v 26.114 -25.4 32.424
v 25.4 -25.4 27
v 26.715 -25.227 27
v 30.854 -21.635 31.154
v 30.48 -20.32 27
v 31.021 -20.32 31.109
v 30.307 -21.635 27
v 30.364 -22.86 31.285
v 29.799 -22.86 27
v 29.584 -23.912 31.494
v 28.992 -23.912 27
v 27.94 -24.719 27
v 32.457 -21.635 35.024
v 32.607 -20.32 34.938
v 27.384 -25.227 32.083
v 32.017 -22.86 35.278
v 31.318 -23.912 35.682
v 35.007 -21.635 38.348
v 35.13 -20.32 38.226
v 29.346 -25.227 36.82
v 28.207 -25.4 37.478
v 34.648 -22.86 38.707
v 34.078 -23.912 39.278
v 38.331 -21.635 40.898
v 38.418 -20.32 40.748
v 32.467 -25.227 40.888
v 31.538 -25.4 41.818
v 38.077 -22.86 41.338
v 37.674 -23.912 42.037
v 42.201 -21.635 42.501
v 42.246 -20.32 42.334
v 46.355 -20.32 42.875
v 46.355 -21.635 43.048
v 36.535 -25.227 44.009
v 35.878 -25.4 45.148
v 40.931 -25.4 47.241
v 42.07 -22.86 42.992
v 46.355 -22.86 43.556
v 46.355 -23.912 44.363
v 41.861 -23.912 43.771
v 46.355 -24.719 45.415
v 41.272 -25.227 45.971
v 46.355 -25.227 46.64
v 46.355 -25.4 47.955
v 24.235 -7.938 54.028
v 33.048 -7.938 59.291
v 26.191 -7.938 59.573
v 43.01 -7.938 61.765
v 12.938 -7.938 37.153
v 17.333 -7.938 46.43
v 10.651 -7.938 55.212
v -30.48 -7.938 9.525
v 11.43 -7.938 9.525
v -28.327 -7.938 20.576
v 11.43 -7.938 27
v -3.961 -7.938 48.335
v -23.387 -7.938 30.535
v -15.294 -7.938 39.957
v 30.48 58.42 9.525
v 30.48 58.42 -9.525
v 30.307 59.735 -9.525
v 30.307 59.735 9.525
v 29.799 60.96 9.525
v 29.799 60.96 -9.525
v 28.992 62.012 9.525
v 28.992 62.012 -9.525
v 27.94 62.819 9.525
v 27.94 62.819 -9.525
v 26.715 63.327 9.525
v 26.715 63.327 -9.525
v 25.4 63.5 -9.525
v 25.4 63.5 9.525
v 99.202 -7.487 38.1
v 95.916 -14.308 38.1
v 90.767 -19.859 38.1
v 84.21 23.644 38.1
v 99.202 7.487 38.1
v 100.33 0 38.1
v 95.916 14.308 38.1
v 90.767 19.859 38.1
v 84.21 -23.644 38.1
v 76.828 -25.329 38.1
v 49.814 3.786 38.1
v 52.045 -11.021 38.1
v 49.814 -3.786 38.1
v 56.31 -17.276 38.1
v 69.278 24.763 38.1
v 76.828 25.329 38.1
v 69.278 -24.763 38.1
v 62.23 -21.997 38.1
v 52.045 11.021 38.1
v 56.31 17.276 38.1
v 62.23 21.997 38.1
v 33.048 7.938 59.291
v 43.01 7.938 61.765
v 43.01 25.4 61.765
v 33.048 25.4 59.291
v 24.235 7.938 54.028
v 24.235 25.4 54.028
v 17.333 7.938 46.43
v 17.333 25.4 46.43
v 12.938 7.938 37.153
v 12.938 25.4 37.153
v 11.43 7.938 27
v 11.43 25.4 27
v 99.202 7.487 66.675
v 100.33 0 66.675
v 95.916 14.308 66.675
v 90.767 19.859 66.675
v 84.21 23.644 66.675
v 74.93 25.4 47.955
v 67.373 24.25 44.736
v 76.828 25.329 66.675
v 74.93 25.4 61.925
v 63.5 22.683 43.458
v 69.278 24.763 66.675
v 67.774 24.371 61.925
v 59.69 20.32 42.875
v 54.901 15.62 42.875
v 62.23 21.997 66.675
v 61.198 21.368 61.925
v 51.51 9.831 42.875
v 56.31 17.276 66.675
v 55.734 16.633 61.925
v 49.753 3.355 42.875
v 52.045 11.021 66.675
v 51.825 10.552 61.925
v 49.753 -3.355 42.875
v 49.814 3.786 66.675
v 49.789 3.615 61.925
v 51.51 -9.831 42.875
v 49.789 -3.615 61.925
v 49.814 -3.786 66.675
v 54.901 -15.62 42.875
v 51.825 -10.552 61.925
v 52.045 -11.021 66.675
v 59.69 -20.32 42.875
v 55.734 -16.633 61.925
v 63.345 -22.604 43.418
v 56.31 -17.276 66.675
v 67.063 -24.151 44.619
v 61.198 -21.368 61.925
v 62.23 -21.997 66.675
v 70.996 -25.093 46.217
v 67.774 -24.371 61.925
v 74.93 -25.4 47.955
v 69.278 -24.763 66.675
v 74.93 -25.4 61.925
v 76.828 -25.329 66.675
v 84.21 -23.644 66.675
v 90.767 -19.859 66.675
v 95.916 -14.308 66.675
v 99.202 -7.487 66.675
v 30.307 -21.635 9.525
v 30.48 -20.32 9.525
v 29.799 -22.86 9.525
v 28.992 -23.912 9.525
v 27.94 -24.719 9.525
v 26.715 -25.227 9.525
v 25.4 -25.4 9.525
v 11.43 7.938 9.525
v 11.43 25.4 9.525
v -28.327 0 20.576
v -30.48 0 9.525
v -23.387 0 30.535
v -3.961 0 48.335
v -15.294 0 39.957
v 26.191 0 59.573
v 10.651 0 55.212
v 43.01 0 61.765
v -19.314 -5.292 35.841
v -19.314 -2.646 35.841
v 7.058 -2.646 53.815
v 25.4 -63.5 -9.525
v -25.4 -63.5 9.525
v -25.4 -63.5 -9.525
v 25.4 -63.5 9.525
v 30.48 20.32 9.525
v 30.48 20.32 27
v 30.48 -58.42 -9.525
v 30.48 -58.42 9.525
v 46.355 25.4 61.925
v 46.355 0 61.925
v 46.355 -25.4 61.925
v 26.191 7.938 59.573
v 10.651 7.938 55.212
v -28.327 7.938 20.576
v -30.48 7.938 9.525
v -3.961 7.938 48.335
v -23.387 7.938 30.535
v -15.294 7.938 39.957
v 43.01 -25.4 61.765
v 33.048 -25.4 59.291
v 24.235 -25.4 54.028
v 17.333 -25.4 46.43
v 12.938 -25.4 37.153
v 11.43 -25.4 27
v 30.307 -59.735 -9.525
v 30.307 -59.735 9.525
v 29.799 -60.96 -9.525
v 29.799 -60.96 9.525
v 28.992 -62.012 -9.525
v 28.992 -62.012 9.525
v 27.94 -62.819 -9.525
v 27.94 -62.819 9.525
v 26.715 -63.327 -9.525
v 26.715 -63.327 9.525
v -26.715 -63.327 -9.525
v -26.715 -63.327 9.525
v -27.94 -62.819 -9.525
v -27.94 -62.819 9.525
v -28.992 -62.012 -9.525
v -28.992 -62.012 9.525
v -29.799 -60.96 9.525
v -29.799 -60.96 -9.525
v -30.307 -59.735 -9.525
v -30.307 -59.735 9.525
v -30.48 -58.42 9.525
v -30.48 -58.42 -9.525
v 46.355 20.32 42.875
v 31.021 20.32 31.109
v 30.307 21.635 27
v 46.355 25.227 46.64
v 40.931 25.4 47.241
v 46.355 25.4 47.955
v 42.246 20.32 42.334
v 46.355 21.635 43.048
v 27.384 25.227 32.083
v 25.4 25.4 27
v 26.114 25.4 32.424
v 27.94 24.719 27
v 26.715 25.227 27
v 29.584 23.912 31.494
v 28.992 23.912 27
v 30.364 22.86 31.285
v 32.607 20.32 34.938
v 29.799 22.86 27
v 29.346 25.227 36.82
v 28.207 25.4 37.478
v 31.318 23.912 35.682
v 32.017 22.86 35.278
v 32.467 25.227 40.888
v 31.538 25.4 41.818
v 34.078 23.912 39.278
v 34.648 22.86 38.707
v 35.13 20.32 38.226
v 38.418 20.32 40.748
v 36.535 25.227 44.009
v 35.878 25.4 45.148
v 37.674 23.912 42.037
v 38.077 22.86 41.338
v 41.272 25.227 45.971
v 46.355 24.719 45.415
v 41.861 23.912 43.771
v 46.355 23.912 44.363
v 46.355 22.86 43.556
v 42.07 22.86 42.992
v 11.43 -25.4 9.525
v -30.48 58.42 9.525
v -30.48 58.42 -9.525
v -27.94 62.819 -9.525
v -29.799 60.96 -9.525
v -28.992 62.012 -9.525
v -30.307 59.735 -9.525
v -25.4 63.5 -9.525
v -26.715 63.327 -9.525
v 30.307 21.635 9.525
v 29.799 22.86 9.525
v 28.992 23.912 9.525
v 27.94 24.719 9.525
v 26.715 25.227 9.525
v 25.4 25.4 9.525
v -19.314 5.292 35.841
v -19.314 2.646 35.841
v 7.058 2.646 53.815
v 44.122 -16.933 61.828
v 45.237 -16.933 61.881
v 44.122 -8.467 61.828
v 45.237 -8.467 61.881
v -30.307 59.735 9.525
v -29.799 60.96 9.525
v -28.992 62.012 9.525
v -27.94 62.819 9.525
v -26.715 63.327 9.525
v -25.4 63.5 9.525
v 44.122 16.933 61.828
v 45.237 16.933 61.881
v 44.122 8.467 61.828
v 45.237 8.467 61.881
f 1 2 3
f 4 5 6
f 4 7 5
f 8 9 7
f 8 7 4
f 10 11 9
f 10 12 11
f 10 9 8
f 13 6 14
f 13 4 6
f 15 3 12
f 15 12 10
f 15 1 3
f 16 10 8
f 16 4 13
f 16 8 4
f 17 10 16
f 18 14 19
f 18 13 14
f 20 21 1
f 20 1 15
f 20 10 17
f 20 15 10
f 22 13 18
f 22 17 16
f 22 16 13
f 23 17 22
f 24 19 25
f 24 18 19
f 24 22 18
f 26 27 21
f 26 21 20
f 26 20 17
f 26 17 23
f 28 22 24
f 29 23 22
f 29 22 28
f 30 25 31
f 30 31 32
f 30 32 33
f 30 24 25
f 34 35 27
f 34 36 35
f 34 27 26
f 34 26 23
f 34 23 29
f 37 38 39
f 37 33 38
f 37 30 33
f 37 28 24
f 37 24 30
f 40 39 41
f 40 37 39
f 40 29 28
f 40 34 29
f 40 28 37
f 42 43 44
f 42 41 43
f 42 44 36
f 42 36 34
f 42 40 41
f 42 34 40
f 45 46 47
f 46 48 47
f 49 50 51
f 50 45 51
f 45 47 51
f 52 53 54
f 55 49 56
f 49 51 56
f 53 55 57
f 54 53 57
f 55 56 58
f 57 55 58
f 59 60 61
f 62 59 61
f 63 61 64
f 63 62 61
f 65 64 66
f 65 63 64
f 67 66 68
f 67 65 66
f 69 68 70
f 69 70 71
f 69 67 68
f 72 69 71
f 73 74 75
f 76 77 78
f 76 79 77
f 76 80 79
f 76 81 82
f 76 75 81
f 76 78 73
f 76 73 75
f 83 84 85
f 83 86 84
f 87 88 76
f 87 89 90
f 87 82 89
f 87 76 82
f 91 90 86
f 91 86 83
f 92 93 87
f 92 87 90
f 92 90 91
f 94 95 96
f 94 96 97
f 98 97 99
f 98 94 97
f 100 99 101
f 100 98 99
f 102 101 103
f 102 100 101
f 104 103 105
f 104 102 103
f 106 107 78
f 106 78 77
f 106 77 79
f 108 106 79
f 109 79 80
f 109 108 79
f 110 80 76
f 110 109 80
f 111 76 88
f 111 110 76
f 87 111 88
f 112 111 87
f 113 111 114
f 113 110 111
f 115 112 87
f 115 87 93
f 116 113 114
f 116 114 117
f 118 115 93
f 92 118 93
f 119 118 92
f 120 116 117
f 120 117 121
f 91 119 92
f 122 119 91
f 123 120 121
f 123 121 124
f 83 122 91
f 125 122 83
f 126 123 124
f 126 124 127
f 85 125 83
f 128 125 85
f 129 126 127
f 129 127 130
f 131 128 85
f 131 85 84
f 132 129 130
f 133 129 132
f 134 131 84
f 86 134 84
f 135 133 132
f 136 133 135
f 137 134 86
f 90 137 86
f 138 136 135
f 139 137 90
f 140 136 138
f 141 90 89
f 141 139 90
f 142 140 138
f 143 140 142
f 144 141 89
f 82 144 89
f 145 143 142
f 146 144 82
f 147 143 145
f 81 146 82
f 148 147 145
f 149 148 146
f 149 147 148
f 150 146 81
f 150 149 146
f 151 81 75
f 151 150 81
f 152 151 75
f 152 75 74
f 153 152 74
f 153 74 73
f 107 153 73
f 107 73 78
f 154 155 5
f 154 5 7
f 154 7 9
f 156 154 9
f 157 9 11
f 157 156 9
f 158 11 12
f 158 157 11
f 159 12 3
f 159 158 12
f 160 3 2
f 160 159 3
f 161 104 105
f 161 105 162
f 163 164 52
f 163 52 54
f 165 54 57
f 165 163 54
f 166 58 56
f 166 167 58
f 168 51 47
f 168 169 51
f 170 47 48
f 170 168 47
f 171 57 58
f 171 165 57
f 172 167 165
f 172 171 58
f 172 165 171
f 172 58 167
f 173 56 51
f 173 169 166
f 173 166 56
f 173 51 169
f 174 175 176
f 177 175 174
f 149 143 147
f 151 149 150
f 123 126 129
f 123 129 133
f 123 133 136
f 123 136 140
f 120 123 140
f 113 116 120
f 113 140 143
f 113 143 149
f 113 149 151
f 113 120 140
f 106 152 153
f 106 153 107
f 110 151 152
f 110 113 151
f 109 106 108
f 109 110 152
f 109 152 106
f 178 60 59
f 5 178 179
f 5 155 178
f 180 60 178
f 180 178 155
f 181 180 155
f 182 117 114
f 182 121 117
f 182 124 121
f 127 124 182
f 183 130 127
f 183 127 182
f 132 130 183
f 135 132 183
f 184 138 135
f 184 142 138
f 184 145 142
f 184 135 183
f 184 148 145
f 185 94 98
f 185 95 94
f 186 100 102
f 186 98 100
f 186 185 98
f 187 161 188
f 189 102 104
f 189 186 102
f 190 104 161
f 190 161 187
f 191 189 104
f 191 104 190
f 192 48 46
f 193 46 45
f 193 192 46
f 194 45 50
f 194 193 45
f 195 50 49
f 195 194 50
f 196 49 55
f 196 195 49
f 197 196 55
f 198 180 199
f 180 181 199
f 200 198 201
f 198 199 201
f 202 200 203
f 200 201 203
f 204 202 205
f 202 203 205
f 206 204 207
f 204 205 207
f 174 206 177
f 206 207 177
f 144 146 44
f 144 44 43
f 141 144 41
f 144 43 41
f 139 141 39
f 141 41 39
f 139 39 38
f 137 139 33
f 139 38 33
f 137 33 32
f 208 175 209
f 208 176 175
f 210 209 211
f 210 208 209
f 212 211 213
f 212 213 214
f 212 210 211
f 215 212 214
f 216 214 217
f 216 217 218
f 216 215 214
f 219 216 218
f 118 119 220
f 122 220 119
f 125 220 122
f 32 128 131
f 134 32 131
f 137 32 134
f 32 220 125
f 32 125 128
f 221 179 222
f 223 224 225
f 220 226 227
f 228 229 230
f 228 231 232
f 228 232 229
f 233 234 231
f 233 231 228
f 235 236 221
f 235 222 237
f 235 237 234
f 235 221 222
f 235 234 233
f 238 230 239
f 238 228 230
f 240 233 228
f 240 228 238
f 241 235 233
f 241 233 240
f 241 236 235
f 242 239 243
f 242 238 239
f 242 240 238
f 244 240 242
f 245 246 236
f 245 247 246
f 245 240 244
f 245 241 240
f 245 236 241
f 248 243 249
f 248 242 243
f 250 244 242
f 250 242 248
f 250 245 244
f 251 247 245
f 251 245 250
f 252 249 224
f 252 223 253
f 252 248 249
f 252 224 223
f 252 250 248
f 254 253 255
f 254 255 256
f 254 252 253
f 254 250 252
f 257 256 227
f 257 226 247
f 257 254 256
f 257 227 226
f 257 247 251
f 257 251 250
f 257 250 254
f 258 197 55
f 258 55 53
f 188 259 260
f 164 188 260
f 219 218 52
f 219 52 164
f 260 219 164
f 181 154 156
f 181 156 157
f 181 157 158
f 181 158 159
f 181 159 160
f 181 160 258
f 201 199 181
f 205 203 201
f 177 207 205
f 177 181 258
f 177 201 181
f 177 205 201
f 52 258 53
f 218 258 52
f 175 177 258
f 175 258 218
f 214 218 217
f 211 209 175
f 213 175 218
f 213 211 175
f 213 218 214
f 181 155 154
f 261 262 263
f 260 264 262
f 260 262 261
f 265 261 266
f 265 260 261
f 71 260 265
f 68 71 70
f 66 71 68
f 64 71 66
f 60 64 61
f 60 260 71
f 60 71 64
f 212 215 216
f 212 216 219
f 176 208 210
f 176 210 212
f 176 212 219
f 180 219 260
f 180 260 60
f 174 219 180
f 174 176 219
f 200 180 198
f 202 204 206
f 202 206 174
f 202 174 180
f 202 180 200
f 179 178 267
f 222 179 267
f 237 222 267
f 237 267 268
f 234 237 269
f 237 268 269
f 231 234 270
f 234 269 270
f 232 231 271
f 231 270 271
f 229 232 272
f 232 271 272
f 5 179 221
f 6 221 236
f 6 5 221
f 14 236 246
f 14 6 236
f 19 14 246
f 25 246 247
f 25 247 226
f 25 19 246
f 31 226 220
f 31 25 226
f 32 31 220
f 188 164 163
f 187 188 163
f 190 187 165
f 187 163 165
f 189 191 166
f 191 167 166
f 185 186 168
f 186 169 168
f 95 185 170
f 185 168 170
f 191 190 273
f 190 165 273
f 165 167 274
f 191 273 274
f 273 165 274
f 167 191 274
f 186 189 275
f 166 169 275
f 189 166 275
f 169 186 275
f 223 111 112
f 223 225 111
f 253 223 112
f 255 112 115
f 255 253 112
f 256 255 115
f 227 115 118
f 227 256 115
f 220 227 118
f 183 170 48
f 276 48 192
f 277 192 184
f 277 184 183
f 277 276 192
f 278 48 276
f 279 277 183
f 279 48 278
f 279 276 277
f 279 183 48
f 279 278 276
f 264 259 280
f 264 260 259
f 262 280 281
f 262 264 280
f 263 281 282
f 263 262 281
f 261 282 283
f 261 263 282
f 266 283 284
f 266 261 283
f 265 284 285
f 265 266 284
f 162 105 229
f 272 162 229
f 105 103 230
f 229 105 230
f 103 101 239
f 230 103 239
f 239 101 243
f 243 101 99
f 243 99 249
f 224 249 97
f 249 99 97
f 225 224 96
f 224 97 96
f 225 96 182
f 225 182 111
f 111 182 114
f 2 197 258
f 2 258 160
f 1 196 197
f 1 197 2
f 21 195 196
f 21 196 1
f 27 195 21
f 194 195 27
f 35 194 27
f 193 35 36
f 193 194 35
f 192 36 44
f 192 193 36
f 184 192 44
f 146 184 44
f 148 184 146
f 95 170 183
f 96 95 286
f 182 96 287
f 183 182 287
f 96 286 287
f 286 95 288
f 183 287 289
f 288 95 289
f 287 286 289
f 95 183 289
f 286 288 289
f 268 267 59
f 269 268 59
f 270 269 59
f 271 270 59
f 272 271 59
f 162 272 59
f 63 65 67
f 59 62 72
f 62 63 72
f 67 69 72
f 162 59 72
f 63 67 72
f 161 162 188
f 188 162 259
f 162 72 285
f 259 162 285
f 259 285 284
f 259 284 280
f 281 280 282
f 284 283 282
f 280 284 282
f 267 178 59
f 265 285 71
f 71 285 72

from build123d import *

# Parameters (mm, degrees)
F1_DEPTH     = 63.5
F0_W         = 25.4
F0_H         = 19.05
F2_DEPTH     = 25.4
F3_DEPTH     = 7.9375
F5_R         = 5.08
F6_T1_DEPTH  = 17.4752
F6_T6_DEPTH  = 50.165
F6_S7_R      = 25.4
F6_T8_DEPTH  = 27
F6_T10_ANGLE = 90
F7_T1_DEPTH  = 17.4752
F7_T6_DEPTH  = 50.165
F7_S7_R      = 25.4
F7_T8_DEPTH  = 27
F7_T10_ANGLE = 90


# Not quite as in the source:
# - a fillet or chamfer that OpenCascade refuses, or shapes differently, is made with other operations: its cross-section is extruded or revolved along the edge and cut away or added


with BuildPart() as f1:
    # F0 (on Front) → F1 (new body, symmetric)
    with BuildSketch(Plane.XZ):
        Polygon((11.43, 9.525), (-30.48, 9.525), (-30.48, -9.525), (30.48, -9.525), (30.48, 9.525), align=None)
    extrude(amount=F1_DEPTH, both=True)

    # F0 (on Front) → F2 (join, symmetric)
    with BuildSketch(Plane.XZ):
        with BuildLine():
            Line((11.43, 27.0002), (11.43, 9.525))
            Line((11.43, 9.525), (30.48, 9.525))
            Line((30.48, 9.525), (30.48, 27.0002))
            ThreePointArc((30.48, 27.0002), (35.1296798487, 38.2255201513), (46.355, 42.8752))
            Line((46.355, 42.8752), (49.53, 42.8752))
            Line((49.53, 42.8752), (49.53, 61.9252))
            Line((49.53, 61.9252), (46.355, 61.9252))
            add(Edge.make_bspline(
                [(43.0102942151, 61.7646727878), (44.1205521815, 61.8325692622), (45.2356507943, 61.8861371605), (46.355, 61.9252)],
                knots=[90.4192998356, 90.4192998356, 90.4192998356, 90.4192998356, 93.0021407551, 93.0021407551, 93.0021407551, 93.0021407551], degree=3))
            ThreePointArc((43.0102942151, 61.7646727878), (20.5037962124, 50.4836172925), (11.43, 27.0002))
        make_face()
        with Locations((62.23, 52.4002)):
            Rectangle(F0_W, F0_H)
    extrude(amount=F2_DEPTH, both=True)

    # F0 (on Front) → F3 (join, symmetric)
    with BuildSketch(Plane.XZ):
        with BuildLine():
            add(Edge.make_bspline(
                [(-30.48, 9.525), (-28.7924455478, 39.4506532923), (4.142725098, 59.3877739136), (43.0102942151, 61.7646727878)],
                knots=[0, 0, 0, 0, 90.4192998356, 90.4192998356, 90.4192998356, 90.4192998356], degree=3))
            Line((-30.48, 9.525), (11.43, 9.525))
            Line((11.43, 9.525), (11.43, 27.0002))
            ThreePointArc((11.43, 27.0002), (20.5037962124, 50.4836172925), (43.0102942151, 61.7646727878))
        make_face()
    extrude(amount=F3_DEPTH, both=True)

    # F0 (on Front) → F4 (revolve)
    with BuildSketch(Plane.XZ):
        Polygon((74.93, 66.675), (74.93, 61.9252), (74.93, 42.8752), (74.93, 38.1), (100.33, 38.1), (100.33, 66.675), align=None)
    revolve(axis=Axis((74.93, 0, 52.3875), (0, 0, 1)))

    # F5
    f5_edges = [f1.edges().sort_by_distance(p)[0] for p in [
        (30.48, -63.5, 0),
        (-30.48, -63.5, 0),
        (30.48, 63.5, 0),
        (-30.48, 63.5, 0),
    ]]
    fillet(f5_edges, radius=F5_R)

    # F6: fillet of radius 5.08 on 1 edges, made by hand

    # F6_s2 → F6_t1 (cut)
    with BuildSketch(Plane.XY.offset(9.525)):
        with BuildLine():
            ThreePointArc((30.48, -20.32), (28.9921024484, -23.9121024484), (25.4, -25.4))
            Line((25.4, -25.4), (30.48, -25.4))
            Line((30.48, -25.4), (30.48, -20.32))
        make_face()
    extrude(amount=F6_T1_DEPTH, mode=Mode.SUBTRACT)


with BuildPart() as f6_tool4:
    # F6_s5 → F6_t6 (new body)
    with BuildSketch(Plane.YZ.offset(46.355)):
        with BuildLine():
            ThreePointArc((-25.4, 47.9552), (-23.9121024484, 44.3630975516), (-20.32, 42.8752))
            Line((-20.32, 42.8752), (-25.4, 42.8752))
            Line((-25.4, 42.8752), (-25.4, 47.9552))
        make_face()
    extrude(amount=F6_T6_DEPTH)

    # F6_s7 → F6_t8 (cut, symmetric)
    with BuildSketch(Plane.XY.offset(45.4)):
        with Locations((74.93, 0)):
            Circle(F6_S7_R)
    extrude(amount=F6_T8_DEPTH, both=True, mode=Mode.SUBTRACT)


with BuildPart() as f1_1:
    add(f1.part)

    # F6_t3: cut F6_tool4
    add(f6_tool4.part, mode=Mode.SUBTRACT)

    # F6_s9 → F6_t10 (revolve, cut)
    with BuildSketch(Plane.XY.offset(27.0002)):
        with BuildLine():
            ThreePointArc((30.48, -20.32), (28.9921024484, -23.9121024484), (25.4, -25.4))
            Line((25.4, -25.4), (30.48, -25.4))
            Line((30.48, -25.4), (30.48, -20.32))
        make_face()
    revolve(axis=Axis((46.355, -25.4, 27.0002), (0, 1, 0)), revolution_arc=F6_T10_ANGLE, mode=Mode.SUBTRACT)

    # F7: fillet of radius 5.08 on 3 edges, made by hand

    # F7_s2 → F7_t1 (cut)
    with BuildSketch(Plane.XY.offset(9.525)):
        with BuildLine():
            ThreePointArc((30.48, 20.32), (28.9921024484, 23.9121024484), (25.4, 25.4))
            Line((25.4, 25.4), (30.48, 25.4))
            Line((30.48, 25.4), (30.48, 20.32))
        make_face()
    extrude(amount=F7_T1_DEPTH, mode=Mode.SUBTRACT)


with BuildPart() as f7_tool4:
    # F7_s5 → F7_t6 (new body)
    with BuildSketch(Plane.YZ.offset(46.355)):
        with BuildLine():
            ThreePointArc((25.4, 47.9552), (23.9121024484, 44.3630975516), (20.32, 42.8752))
            Line((20.32, 42.8752), (25.4, 42.8752))
            Line((25.4, 42.8752), (25.4, 47.9552))
        make_face()
    extrude(amount=F7_T6_DEPTH)

    # F7_s7 → F7_t8 (cut, symmetric)
    with BuildSketch(Plane.XY.offset(45.4)):
        with Locations((74.93, 0)):
            Circle(F7_S7_R)
    extrude(amount=F7_T8_DEPTH, both=True, mode=Mode.SUBTRACT)


with BuildPart() as f1_2:
    add(f1_1.part)

    # F7_t3: cut F7_tool4
    add(f7_tool4.part, mode=Mode.SUBTRACT)

    # F7_s9 → F7_t10 (revolve, cut)
    with BuildSketch(Plane.XY.offset(27.0002)):
        with BuildLine():
            ThreePointArc((25.4, 25.4), (28.9921024484, 23.9121024484), (30.48, 20.32))
            Line((30.48, 20.32), (30.48, 25.4))
            Line((30.48, 25.4), (25.4, 25.4))
        make_face()
    revolve(axis=Axis((46.355, 25.4, 27.0002), (0, 1, 0)), revolution_arc=F7_T10_ANGLE, mode=Mode.SUBTRACT)


solid = f1_2.part
